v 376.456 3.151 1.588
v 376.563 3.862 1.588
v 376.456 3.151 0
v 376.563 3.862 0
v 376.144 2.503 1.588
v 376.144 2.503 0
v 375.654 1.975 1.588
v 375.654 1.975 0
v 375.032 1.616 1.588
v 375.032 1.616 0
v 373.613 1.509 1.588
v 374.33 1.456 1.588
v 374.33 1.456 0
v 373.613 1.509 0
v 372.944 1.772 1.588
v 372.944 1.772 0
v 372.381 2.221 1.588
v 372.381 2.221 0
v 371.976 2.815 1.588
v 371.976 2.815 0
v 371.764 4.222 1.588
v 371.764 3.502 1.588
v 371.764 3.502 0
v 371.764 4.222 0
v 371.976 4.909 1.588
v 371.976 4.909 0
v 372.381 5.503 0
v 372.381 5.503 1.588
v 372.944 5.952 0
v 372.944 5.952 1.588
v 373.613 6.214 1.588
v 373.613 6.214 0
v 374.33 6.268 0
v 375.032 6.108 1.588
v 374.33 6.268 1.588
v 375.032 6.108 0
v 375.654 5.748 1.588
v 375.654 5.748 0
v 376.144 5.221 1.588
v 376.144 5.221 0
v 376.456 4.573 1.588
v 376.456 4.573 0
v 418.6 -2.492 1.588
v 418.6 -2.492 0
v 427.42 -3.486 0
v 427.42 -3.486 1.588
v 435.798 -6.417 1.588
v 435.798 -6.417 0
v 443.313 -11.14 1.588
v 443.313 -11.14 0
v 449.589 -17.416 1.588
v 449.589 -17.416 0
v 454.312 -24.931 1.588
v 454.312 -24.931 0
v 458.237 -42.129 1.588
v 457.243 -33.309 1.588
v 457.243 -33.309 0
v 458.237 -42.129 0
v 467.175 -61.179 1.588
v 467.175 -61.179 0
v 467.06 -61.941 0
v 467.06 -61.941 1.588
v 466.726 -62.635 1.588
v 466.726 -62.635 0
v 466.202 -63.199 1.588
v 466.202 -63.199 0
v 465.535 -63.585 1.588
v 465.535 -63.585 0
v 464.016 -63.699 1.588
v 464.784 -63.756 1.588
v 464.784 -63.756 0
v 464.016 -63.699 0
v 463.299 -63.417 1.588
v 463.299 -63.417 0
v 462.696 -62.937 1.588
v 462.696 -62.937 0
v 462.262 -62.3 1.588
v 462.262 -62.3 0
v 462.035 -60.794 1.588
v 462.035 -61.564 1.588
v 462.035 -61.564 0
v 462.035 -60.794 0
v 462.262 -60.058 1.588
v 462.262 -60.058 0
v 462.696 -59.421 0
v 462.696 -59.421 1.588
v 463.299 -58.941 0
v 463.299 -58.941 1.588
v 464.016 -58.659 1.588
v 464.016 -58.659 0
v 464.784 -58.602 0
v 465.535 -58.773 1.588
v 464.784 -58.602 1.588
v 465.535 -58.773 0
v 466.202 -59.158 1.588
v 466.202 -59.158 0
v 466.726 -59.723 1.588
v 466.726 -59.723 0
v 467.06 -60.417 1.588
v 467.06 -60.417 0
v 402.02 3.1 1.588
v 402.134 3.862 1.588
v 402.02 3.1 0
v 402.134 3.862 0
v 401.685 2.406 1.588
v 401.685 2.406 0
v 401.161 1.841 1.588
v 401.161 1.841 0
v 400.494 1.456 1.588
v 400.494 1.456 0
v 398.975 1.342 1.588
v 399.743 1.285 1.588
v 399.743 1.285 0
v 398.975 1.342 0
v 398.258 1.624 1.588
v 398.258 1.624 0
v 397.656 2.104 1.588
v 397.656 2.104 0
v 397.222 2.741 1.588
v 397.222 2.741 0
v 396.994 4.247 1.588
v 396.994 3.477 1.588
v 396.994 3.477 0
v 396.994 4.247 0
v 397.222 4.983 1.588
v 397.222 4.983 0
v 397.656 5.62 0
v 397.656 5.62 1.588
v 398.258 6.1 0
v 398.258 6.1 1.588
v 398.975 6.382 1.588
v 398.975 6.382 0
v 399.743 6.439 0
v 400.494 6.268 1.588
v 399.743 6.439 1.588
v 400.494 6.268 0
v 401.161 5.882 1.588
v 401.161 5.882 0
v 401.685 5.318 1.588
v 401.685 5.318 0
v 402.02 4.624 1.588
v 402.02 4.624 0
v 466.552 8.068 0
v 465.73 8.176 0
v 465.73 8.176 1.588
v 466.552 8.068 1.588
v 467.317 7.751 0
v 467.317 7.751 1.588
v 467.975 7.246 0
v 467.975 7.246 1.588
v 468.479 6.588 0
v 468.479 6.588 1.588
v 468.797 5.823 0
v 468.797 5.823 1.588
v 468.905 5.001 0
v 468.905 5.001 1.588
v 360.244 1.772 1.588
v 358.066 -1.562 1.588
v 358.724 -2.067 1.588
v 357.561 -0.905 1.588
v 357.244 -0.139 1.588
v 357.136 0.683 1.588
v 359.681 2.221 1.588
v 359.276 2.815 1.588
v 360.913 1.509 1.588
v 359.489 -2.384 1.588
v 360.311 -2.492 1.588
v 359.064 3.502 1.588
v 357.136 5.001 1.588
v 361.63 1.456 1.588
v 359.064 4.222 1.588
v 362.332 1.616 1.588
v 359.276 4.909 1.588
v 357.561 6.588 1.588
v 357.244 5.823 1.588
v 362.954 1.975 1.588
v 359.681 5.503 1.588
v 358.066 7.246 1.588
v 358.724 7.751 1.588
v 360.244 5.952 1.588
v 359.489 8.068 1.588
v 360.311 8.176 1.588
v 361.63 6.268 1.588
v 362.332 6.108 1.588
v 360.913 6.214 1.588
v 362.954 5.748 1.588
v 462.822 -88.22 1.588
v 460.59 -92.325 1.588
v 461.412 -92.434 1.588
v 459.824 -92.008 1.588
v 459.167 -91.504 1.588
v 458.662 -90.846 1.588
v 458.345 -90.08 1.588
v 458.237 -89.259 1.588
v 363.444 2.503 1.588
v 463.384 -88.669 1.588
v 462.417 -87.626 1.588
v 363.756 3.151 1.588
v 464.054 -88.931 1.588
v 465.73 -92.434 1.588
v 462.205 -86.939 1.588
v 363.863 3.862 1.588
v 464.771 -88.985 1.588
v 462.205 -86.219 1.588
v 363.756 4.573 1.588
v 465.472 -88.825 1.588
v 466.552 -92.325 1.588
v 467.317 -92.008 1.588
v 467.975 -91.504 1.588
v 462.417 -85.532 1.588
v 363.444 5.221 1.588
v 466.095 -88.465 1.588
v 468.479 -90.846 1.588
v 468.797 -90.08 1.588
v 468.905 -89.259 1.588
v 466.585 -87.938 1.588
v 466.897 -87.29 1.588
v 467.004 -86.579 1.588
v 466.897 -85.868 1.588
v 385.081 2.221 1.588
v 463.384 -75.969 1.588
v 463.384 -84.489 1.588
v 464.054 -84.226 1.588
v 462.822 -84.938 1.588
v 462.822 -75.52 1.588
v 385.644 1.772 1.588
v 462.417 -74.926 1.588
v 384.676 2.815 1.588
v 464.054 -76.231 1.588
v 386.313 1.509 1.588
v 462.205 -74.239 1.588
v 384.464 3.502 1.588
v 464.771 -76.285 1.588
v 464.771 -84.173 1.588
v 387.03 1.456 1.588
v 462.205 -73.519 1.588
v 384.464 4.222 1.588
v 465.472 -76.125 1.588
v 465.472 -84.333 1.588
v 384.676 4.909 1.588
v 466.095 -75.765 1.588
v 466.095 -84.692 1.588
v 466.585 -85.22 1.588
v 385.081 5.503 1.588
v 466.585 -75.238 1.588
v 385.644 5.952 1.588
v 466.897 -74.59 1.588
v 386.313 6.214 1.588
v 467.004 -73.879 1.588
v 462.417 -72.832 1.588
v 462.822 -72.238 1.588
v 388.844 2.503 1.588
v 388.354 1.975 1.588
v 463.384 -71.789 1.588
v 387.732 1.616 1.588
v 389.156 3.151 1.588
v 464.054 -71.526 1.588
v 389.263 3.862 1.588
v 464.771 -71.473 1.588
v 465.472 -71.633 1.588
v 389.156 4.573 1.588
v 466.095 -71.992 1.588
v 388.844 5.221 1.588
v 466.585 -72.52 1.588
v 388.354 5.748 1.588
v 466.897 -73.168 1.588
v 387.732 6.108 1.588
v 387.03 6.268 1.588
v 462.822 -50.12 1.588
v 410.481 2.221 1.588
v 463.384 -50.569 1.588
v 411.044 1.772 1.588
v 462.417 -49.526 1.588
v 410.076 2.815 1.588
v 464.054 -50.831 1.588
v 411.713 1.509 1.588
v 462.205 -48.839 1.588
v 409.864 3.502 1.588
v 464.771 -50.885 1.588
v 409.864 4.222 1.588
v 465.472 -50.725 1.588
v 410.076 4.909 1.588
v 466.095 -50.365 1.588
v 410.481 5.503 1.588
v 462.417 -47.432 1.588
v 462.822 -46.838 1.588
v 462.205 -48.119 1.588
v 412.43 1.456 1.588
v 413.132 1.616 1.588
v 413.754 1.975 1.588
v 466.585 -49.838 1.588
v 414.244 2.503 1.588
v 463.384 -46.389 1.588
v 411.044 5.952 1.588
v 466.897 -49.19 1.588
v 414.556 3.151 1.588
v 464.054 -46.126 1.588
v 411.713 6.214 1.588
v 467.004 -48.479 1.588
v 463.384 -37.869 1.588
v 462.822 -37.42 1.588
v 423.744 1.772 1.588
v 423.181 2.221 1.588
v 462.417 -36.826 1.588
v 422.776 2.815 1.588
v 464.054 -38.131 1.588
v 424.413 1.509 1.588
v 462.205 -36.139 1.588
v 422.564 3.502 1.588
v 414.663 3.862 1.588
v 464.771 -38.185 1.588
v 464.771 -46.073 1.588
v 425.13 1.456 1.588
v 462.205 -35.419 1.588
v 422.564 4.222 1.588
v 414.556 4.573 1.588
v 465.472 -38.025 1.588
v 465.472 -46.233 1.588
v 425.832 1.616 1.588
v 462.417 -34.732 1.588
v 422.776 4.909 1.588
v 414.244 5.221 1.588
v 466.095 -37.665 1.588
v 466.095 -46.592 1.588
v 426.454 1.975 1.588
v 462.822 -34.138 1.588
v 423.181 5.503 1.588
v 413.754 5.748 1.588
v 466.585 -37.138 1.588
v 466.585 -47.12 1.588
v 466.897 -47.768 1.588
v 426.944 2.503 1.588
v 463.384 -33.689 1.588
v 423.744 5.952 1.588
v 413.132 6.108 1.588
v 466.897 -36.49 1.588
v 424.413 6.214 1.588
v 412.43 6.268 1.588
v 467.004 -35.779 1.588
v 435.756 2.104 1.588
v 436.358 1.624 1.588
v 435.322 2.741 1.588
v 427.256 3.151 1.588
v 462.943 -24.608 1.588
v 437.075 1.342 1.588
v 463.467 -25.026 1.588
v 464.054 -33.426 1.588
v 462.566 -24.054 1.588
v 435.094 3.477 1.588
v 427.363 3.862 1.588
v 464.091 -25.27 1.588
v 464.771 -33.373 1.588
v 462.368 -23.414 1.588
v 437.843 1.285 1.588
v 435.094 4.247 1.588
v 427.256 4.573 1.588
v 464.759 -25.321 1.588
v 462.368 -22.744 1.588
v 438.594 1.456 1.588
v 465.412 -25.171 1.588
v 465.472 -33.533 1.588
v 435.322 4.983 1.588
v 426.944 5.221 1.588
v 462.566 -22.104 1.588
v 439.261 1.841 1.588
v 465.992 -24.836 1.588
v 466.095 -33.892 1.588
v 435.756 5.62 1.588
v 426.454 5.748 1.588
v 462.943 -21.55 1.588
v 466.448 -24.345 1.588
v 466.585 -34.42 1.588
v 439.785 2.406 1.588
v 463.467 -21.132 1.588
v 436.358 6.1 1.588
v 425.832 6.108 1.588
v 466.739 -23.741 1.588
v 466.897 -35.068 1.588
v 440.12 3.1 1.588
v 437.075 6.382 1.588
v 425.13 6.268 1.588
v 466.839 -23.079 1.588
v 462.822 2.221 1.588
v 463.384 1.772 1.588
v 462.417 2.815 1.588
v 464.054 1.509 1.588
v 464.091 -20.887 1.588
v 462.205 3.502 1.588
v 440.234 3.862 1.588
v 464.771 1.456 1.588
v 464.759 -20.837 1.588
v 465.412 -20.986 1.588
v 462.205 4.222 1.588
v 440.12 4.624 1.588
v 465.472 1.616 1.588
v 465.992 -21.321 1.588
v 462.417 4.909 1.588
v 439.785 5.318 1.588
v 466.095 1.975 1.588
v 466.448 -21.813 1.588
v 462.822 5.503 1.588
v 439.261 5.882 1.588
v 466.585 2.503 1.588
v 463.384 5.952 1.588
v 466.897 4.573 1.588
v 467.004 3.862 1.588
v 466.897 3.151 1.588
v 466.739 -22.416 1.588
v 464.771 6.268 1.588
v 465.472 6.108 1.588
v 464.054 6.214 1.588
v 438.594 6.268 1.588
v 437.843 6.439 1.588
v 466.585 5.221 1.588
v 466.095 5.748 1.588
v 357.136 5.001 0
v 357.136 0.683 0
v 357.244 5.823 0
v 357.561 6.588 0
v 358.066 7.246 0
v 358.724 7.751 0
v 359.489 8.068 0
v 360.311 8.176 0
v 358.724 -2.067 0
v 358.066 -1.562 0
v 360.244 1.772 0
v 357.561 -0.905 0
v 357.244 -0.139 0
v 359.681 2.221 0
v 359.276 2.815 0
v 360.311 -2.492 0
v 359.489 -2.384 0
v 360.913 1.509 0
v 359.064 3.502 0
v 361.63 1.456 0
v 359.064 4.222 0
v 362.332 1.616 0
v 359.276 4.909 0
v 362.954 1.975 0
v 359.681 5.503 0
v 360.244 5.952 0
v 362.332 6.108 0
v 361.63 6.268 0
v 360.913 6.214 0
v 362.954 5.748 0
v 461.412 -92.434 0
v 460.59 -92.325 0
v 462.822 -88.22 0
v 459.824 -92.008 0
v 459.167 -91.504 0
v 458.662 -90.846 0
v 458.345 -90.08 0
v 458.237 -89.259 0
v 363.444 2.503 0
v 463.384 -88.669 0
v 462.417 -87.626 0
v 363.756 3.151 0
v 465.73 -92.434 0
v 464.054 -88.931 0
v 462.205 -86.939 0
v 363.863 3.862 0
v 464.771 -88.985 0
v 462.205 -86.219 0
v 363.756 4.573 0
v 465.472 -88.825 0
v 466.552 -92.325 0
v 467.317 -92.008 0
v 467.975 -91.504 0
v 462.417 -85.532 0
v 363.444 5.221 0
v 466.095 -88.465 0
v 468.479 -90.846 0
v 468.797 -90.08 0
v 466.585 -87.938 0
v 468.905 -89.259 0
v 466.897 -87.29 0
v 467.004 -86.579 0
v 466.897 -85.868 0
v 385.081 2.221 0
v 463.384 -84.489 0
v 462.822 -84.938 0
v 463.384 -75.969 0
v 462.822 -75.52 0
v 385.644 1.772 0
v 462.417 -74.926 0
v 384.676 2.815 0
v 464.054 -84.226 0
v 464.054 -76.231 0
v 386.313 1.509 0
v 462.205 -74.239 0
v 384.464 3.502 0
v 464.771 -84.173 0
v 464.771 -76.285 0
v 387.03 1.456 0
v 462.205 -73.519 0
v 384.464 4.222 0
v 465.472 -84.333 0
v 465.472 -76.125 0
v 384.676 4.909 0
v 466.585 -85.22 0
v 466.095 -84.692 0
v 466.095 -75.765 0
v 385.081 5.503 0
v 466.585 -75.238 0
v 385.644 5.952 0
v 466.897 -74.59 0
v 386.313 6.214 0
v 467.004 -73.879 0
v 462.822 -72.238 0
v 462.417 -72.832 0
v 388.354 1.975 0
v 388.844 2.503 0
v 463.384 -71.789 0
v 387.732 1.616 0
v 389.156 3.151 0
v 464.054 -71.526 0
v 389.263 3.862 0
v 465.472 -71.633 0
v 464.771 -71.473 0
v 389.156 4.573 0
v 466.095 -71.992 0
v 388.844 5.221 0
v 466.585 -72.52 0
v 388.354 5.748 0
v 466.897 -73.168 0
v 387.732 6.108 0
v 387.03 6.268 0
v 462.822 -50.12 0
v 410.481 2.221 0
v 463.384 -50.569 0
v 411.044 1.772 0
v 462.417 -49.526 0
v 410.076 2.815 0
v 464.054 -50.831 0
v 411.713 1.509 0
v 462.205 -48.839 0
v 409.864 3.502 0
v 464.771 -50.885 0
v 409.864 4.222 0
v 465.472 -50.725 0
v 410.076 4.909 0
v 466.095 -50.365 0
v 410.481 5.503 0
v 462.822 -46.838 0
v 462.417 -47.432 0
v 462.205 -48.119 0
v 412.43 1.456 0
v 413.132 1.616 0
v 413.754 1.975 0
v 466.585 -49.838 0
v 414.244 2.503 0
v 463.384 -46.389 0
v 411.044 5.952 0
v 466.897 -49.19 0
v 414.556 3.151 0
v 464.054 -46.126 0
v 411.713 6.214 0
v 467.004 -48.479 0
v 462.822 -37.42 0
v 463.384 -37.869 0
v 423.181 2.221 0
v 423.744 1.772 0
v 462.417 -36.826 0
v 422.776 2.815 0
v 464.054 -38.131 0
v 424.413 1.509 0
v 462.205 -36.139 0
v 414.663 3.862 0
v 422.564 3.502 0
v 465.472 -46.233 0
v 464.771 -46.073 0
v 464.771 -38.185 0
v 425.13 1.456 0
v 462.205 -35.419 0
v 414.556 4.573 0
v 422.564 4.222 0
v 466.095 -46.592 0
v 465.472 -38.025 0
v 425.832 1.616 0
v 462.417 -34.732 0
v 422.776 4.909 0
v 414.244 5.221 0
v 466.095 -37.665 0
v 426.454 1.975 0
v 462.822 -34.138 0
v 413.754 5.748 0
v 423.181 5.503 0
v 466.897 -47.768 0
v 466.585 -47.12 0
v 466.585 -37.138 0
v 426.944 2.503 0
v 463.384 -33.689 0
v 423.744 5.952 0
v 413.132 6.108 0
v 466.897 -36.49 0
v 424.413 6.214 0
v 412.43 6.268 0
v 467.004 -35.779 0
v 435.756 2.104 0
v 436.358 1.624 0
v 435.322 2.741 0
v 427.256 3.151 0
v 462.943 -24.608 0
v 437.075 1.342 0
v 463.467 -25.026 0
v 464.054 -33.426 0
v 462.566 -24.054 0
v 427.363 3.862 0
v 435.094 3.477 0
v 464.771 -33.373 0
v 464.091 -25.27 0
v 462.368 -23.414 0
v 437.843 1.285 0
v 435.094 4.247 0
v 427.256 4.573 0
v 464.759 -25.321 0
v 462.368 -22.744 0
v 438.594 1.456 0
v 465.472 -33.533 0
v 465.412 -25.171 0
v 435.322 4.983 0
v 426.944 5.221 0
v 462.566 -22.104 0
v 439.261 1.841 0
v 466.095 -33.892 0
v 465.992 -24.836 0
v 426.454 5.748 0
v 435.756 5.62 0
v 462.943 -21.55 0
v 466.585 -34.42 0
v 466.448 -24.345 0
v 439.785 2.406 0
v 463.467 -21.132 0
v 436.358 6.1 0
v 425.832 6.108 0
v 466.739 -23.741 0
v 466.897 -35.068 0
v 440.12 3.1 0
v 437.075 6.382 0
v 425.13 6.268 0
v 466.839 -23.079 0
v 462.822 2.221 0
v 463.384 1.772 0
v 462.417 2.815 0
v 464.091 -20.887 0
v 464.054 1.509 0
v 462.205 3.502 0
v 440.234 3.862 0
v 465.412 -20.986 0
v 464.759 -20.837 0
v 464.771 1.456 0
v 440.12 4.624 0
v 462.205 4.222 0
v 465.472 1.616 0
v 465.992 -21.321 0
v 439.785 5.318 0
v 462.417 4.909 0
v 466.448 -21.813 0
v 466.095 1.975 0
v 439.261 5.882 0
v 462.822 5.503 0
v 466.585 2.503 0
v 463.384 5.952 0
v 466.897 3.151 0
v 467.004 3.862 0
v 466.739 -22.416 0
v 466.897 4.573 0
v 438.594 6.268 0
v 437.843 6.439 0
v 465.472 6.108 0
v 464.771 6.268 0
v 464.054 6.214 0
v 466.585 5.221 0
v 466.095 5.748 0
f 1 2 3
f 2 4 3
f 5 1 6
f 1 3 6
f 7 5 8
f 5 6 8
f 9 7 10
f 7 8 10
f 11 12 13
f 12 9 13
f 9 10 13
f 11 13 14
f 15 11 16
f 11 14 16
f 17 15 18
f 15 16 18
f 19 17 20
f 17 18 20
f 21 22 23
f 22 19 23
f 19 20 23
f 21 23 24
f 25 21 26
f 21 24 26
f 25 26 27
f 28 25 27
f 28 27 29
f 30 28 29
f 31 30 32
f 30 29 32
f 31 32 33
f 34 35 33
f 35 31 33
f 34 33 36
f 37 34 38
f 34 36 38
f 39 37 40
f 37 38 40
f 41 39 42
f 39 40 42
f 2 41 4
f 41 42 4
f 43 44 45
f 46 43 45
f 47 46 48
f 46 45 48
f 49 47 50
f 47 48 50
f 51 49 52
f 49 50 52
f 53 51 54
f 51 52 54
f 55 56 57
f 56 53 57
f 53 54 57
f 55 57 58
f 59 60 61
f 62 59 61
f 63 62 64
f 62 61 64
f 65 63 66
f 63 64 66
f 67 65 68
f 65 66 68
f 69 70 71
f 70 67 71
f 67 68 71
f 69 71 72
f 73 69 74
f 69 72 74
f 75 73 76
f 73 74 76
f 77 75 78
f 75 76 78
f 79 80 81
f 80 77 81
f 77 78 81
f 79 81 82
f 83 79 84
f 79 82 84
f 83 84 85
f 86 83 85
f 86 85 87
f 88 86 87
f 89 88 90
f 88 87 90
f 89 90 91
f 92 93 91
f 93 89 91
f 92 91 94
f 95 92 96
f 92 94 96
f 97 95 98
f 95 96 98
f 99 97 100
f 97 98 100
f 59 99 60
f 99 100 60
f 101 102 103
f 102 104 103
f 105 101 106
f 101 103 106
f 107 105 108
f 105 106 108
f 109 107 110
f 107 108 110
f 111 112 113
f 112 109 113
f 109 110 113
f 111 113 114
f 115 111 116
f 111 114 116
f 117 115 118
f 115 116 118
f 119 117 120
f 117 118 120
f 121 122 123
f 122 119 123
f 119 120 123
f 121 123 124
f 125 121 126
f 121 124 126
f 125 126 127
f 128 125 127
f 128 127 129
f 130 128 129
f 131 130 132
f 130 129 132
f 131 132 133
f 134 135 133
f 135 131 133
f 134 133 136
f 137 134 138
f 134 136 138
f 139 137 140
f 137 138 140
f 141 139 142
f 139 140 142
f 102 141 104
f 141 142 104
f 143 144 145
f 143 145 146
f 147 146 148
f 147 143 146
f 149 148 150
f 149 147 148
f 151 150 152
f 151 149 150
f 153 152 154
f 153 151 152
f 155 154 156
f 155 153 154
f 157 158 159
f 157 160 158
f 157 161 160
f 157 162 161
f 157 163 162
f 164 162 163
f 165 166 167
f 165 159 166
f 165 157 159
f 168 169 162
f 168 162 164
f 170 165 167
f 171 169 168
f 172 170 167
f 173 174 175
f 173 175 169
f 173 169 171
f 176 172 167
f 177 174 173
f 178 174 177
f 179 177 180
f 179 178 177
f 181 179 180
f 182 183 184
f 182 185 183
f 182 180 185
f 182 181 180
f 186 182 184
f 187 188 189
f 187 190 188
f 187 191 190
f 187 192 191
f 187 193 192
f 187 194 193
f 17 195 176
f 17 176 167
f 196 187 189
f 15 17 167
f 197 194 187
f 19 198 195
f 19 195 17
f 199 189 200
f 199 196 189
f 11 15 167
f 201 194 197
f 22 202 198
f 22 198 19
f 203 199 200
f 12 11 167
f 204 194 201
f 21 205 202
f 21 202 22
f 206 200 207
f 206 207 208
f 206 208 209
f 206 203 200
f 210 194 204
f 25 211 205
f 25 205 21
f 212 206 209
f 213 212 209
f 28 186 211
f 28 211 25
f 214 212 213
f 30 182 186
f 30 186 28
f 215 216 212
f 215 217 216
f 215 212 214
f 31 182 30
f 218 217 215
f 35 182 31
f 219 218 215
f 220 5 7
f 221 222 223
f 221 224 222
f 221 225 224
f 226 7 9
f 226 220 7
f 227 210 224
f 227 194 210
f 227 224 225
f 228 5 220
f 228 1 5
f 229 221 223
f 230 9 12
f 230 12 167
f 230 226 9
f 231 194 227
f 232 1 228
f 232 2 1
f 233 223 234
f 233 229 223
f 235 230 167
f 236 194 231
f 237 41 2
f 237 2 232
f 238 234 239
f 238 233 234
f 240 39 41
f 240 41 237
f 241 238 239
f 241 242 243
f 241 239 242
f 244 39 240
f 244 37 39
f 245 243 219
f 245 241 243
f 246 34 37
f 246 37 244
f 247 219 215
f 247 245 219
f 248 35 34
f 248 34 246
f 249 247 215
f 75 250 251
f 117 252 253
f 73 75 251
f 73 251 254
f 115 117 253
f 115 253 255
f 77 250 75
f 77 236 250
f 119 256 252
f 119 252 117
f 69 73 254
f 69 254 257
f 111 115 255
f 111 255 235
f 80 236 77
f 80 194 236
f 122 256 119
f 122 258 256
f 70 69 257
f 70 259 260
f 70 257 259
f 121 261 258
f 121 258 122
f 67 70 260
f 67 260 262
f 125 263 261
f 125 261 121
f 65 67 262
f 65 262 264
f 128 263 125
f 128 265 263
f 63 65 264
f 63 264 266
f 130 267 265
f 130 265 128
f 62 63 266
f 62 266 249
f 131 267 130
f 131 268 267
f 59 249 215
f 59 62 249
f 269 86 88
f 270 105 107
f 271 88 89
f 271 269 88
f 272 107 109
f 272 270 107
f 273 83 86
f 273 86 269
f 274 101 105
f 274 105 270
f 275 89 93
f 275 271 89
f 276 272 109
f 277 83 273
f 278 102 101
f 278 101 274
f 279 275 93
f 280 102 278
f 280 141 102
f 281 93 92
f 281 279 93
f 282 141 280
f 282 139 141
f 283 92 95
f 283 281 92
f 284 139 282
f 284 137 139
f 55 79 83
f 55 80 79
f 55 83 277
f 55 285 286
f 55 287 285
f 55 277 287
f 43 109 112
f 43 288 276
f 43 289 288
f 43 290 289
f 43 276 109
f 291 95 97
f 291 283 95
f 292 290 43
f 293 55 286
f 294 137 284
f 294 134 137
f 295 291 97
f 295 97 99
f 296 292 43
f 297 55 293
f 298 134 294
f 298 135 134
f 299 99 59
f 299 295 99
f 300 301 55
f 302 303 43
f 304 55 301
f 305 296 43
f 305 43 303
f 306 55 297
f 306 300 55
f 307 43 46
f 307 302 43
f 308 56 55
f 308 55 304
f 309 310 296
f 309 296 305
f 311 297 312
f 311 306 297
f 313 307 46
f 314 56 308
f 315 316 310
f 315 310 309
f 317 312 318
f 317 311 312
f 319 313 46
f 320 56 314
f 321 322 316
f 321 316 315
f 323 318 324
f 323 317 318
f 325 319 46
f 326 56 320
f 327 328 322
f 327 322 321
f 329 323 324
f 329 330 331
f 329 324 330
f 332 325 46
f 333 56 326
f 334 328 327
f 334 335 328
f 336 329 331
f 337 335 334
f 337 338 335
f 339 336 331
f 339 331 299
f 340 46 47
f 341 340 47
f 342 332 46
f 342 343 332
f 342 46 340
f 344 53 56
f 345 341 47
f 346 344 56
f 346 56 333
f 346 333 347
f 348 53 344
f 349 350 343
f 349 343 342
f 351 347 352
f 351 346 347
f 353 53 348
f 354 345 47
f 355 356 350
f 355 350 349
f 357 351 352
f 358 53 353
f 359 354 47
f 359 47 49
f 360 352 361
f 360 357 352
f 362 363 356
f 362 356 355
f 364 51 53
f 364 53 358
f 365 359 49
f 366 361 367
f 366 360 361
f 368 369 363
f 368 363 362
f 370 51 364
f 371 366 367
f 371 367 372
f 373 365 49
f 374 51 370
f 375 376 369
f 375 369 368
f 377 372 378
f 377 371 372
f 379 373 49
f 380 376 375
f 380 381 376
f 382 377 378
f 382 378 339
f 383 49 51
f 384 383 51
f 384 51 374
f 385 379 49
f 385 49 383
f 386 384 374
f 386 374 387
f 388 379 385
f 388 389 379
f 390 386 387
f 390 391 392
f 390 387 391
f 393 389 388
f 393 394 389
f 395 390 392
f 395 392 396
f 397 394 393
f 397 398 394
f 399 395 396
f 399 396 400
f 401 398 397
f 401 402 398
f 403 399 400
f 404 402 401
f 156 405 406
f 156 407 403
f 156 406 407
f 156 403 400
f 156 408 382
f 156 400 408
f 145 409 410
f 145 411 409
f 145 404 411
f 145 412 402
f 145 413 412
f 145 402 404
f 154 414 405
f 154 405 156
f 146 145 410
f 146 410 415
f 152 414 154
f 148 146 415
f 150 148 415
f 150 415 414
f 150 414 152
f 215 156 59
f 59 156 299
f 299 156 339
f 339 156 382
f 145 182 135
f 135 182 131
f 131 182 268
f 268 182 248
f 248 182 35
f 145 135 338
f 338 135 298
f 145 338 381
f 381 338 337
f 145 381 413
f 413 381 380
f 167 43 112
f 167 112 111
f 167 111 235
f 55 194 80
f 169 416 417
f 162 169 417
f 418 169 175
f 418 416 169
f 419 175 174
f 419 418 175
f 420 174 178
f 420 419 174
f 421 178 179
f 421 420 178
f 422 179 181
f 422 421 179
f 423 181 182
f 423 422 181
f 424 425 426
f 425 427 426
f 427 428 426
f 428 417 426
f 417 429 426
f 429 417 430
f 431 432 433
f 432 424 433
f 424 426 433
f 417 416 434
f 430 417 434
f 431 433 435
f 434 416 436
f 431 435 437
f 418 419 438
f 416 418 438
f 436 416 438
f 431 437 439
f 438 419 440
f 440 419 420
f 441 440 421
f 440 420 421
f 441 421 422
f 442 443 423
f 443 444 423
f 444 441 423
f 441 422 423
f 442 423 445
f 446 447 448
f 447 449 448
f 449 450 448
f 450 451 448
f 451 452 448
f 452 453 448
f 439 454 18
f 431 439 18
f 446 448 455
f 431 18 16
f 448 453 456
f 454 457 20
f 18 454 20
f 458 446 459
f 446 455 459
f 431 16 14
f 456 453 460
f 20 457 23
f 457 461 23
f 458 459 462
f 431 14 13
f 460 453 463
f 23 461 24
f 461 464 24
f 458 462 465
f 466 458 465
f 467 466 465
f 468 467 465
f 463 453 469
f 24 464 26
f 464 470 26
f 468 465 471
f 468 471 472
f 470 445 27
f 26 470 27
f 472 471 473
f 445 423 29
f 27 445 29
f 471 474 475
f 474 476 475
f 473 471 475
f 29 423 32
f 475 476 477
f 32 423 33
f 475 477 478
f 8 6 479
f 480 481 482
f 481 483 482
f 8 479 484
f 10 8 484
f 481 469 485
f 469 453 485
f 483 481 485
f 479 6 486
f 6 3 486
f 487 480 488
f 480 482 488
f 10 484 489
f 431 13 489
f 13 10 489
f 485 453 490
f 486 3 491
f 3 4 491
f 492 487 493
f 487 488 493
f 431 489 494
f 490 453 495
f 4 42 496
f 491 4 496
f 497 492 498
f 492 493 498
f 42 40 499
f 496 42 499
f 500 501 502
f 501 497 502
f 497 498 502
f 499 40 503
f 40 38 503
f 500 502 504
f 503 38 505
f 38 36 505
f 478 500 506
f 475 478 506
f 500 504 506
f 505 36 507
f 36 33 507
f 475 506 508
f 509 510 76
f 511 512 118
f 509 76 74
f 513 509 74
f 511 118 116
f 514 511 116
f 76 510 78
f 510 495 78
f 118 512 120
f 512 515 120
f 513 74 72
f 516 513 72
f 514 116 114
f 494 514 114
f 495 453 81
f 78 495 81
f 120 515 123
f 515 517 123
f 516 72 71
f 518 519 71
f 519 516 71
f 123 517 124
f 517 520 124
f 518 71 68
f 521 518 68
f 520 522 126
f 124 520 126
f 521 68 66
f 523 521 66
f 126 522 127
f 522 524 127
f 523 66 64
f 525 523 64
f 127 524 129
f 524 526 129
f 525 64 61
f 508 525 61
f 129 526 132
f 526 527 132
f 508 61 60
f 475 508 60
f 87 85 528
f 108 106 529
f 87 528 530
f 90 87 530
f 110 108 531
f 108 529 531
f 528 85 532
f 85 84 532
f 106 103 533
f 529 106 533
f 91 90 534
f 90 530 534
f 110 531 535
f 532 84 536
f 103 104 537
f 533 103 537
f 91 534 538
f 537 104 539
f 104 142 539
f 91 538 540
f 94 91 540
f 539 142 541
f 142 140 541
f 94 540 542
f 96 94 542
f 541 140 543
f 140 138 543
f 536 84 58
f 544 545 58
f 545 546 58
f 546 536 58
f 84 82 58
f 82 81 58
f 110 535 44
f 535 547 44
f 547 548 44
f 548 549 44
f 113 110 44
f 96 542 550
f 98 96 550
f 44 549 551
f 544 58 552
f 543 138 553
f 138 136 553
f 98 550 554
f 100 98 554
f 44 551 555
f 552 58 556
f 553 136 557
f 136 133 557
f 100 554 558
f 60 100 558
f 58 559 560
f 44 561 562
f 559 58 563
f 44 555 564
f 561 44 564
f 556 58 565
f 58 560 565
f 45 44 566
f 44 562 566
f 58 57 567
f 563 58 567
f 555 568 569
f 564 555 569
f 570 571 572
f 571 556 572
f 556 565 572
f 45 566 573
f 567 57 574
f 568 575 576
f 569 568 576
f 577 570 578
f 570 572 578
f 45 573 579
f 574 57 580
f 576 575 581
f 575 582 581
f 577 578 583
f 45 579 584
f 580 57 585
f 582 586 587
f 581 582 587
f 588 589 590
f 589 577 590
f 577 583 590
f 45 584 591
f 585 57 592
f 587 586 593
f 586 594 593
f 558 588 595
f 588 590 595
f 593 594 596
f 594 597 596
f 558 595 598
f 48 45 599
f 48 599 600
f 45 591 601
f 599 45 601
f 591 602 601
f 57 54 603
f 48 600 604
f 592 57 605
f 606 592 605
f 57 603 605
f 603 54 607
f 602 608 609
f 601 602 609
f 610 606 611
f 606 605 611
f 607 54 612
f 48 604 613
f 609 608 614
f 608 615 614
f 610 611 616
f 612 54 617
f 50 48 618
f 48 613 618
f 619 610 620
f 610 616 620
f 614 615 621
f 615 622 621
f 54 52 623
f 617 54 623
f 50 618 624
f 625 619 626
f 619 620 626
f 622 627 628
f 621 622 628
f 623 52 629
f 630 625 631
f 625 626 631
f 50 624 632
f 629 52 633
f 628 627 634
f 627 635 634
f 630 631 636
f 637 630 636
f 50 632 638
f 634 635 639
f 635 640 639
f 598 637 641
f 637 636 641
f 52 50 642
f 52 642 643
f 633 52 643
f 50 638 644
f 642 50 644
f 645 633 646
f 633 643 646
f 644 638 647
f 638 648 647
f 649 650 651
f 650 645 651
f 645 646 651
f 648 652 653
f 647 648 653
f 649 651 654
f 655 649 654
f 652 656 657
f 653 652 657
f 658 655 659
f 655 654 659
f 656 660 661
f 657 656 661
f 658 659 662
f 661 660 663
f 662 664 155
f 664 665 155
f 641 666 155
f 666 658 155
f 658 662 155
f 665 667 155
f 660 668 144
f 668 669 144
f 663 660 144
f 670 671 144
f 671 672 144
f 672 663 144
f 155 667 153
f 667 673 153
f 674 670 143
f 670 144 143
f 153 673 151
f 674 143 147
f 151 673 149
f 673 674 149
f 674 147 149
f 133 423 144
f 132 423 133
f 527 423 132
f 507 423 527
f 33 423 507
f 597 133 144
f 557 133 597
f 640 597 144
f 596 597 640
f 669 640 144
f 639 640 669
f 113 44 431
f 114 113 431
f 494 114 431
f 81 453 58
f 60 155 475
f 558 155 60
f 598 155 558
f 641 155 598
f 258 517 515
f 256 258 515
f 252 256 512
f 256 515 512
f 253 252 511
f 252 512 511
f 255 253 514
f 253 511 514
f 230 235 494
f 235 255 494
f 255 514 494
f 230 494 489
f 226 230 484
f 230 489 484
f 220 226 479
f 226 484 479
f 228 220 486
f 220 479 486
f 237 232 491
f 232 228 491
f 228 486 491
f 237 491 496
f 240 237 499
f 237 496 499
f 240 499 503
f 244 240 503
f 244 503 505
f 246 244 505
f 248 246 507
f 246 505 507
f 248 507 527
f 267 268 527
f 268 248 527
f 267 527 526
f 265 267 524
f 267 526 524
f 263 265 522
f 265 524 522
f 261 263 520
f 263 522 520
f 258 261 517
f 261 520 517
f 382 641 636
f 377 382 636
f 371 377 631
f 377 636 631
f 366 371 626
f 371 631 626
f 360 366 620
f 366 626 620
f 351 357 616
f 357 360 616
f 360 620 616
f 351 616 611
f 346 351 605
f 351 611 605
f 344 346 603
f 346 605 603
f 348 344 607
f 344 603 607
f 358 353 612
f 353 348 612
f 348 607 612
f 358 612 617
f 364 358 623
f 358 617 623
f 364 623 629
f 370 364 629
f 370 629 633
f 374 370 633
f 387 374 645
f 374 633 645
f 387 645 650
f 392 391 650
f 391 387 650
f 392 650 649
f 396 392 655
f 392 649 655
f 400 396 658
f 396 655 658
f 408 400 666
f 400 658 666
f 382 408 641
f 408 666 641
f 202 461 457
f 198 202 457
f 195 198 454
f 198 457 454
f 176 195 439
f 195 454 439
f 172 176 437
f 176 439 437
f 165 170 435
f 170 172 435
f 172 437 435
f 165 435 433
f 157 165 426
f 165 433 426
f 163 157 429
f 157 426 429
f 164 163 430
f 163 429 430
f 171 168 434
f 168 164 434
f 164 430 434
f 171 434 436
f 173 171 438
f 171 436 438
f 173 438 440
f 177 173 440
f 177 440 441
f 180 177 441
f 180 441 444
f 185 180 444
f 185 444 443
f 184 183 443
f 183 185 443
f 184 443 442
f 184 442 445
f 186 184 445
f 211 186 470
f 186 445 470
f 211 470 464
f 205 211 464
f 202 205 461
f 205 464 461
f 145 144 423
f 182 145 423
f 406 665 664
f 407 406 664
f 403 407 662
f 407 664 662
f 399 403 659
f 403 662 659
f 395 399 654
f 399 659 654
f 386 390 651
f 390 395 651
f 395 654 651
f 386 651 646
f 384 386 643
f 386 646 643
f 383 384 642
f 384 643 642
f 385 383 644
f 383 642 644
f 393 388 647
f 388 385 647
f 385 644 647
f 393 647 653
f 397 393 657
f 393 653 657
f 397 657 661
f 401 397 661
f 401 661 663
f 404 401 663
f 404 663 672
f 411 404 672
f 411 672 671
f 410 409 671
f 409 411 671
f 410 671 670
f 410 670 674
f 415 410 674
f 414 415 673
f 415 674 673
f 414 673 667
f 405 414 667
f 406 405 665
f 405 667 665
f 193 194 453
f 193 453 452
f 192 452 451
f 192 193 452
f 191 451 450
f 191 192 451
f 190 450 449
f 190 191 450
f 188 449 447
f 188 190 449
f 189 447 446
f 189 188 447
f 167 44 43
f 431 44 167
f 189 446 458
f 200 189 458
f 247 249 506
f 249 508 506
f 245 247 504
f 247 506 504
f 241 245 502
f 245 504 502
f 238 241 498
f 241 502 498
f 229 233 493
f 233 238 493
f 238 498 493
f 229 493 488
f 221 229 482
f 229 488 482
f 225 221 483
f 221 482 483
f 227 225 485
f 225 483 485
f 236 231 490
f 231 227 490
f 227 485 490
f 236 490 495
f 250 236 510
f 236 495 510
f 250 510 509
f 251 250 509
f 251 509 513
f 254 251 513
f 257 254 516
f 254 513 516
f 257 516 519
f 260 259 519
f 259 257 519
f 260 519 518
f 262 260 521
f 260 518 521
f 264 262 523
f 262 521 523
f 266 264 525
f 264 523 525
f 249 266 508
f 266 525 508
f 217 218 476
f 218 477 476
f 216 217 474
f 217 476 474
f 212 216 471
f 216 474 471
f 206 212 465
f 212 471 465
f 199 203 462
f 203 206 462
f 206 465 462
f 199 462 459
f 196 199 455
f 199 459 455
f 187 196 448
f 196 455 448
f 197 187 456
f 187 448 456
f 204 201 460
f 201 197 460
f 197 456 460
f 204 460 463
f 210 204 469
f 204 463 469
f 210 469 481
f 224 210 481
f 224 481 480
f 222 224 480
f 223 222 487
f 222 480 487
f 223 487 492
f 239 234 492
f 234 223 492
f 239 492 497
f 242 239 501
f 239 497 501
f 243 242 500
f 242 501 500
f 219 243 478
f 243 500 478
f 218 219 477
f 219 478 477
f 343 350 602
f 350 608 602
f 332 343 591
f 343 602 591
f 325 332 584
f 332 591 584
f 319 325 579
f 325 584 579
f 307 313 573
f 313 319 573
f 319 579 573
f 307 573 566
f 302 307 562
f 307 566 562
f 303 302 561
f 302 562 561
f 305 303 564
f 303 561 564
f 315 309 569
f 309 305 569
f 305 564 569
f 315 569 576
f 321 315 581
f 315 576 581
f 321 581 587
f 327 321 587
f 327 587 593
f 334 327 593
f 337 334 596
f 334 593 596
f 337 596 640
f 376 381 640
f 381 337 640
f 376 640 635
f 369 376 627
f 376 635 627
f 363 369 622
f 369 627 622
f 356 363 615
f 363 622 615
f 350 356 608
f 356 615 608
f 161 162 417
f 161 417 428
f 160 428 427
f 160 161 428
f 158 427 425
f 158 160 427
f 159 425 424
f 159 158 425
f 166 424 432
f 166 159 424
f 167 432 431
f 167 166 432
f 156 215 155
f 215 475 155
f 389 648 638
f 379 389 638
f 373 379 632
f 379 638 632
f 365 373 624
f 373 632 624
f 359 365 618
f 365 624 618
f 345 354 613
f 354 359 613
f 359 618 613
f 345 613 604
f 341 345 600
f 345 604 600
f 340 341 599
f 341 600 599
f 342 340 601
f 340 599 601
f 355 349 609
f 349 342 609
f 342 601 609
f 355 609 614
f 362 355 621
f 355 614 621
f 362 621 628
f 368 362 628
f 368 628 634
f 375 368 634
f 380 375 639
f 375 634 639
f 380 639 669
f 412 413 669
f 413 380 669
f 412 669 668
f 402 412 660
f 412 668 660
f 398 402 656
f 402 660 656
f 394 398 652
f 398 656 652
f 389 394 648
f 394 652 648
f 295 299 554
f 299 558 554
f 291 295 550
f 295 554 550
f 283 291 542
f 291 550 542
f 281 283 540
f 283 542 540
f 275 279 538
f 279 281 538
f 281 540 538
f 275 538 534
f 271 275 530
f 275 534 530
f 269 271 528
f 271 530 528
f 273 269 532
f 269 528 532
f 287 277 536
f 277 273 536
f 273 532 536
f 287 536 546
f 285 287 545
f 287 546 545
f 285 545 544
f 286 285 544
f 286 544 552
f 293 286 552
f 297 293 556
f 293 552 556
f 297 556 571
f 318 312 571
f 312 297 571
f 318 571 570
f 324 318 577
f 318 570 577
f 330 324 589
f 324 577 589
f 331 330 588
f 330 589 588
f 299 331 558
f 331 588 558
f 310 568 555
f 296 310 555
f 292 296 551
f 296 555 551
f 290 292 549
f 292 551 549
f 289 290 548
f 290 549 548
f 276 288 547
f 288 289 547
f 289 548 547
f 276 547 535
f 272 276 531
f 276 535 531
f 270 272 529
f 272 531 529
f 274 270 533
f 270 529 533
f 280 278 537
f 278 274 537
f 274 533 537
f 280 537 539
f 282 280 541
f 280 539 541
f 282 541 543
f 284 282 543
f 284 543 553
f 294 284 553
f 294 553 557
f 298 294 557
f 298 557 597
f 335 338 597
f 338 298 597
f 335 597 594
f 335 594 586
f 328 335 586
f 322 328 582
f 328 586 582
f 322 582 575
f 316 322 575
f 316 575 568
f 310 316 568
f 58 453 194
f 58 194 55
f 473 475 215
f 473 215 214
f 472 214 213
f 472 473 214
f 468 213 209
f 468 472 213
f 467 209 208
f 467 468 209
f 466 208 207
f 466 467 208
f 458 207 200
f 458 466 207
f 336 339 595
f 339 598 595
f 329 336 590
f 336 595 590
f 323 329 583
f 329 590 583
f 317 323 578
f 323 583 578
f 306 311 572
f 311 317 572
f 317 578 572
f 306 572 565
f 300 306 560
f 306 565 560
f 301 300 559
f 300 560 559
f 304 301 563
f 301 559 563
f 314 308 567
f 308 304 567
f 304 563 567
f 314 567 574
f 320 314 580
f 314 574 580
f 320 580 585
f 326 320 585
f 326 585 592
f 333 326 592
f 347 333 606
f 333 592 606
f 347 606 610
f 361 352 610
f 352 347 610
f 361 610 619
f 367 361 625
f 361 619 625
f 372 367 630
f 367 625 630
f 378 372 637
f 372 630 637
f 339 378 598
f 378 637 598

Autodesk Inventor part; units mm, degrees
ref_plane "YZ Plane" through (0, 0, 0) normal (1, 0, 0) x (0, 1, 0)
ref_plane "XZ Plane" through (0, 0, 0) normal (0, 1, 0) x (-1, 0, 0)
ref_plane "XY Plane" through (0, 0, 0) normal (0, 0, 1) x (1, 0, 0)
ref_plane "Work Plane1" through (0, 0, 0) normal (0, 0, 1) x (1, 0, 0)
sketch "Sketch1" plane through (0, 0, 0) normal (0, 0, 1) x (1, 0, 0)
  line L0 (468.9048, -89.2586) -> (468.9048, 5.0009) projected
  arc A0 (468.9048, 5.0009) -> (465.7298, 8.1759) centre (465.7298, 5.0009) ccw projected
  line L1 (465.7298, 8.1759) -> (360.311, 8.1759) projected
  line L2 (458.2368, -92.4336) -> (458.2368, -2.4921)
  line L3 (458.2368, -2.4921) -> (357.136, -2.4921)
  arc A1 (360.311, 8.1759) -> (357.136, 5.0009) centre (360.311, 5.0009) ccw projected
  line L4 (357.136, 5.0009) -> (357.136, -89.2586) projected
  arc A2 (357.136, -89.2586) -> (360.311, -92.4336) centre (360.311, -89.2586) ccw projected
  line L5 (360.311, -92.4336) -> (465.7298, -92.4336) projected
  arc A3 (465.7298, -92.4336) -> (468.9048, -89.2586) centre (465.7298, -89.2586) ccw projected
  line L6 (468.9048, -89.2586) -> (468.9048, 5.0009) projected
  arc A4 (468.9048, 5.0009) -> (465.7298, 8.1759) centre (465.7298, 5.0009) ccw projected
  line L7 (465.7298, 8.1759) -> (360.311, 8.1759) projected
  circle A5 centre (437.65, 3.8619) radius 2.5844 projected
  circle A6 centre (372.6092, -23.0789) radius 2.5844 projected
  circle A7 centre (399.55, -88.1196) radius 2.5844 projected
  circle A8 centre (464.5908, -61.1789) radius 2.5844 projected
  circle A9 centre (372.6092, -88.1196) radius 2.413 projected
  circle A10 centre (412.25, 3.8619) radius 2.413 projected
  circle A11 centre (464.5908, -73.8789) radius 2.413 projected
  circle A12 centre (464.5908, -48.4789) radius 2.413 projected
  circle A13 centre (464.5908, -35.7789) radius 2.413 projected
  circle A14 centre (374.15, 3.8619) radius 2.413 projected
  circle A15 centre (386.85, 3.8619) radius 2.413 projected
  arc A16 (365.5823, -19.7251) -> (365.5823, -17.8759) centre (362.2803, -18.8005) ccw projected
  line L8 (365.5823, -19.7251) -> (365.5823, -22.1025) projected
  line L9 (365.5823, -22.1025) -> (363.2049, -22.1025) projected
  arc A17 (361.3557, -22.1025) -> (363.2049, -22.1025) centre (362.2803, -18.8005) ccw projected
  line L10 (361.3557, -22.1025) -> (358.9783, -22.1025) projected
  line L11 (358.9783, -22.1025) -> (358.9783, -19.7251) projected
  arc A18 (358.9783, -17.8759) -> (358.9783, -19.7251) centre (362.2803, -18.8005) ccw projected
  line L12 (358.9783, -17.8759) -> (358.9783, -15.4985) projected
  line L13 (358.9783, -15.4985) -> (361.3557, -15.4985) projected
  arc A19 (363.2049, -15.4985) -> (361.3557, -15.4985) centre (362.2803, -18.8005) ccw projected
  line L14 (363.2049, -15.4985) -> (365.5823, -15.4985) projected
  line L15 (365.5823, -15.4985) -> (365.5823, -17.8759) projected
  circle A20 centre (424.95, 3.8619) radius 2.413 projected
  arc A21 (358.9783, -64.5327) -> (358.9783, -66.3818) centre (362.2803, -65.4572) ccw projected
  line L16 (358.9783, -64.5327) -> (358.9783, -62.1552) projected
  line L17 (358.9783, -62.1552) -> (361.3557, -62.1552) projected
  arc A22 (363.2049, -62.1552) -> (361.3557, -62.1552) centre (362.2803, -65.4572) ccw projected
  line L18 (363.2049, -62.1552) -> (365.5823, -62.1552) projected
  line L19 (365.5823, -62.1552) -> (365.5823, -64.5327) projected
  arc A23 (365.5823, -66.3818) -> (365.5823, -64.5327) centre (362.2803, -65.4572) ccw projected
  line L20 (365.5823, -66.3818) -> (365.5823, -68.7592) projected
  line L21 (365.5823, -68.7592) -> (363.2049, -68.7592) projected
  arc A24 (361.3557, -68.7592) -> (363.2049, -68.7592) centre (362.2803, -65.4572) ccw projected
  line L22 (361.3557, -68.7592) -> (358.9783, -68.7592) projected
  line L23 (358.9783, -68.7592) -> (358.9783, -66.3818) projected
  circle A25 centre (464.5908, -86.5789) radius 2.413 projected
  circle A26 centre (464.5908, -23.0789) radius 1.9844 projected
  circle A27 centre (464.5908, 3.8619) radius 2.413 projected
  circle A28 centre (361.45, 3.8619) radius 2.413 projected
  circle A29 centre (418.6, -42.1289) radius 36.6 projected
  circle A30 centre (437.65, -88.1196) radius 2.5844 projected
  circle A31 centre (372.6092, -61.1789) radius 2.5844 projected
  circle A32 centre (399.55, 3.8619) radius 2.5844 projected
  circle A33 centre (418.6, -42.1289) radius 39.6368
  circle A34 centre (464.5908, 3.8619) radius 2.2479
  circle A35 centre (464.5908, -23.0789) radius 2.2479
  circle A36 centre (464.5908, -35.7789) radius 2.2479
  circle A37 centre (464.5908, -48.4789) radius 2.2479
  circle A38 centre (464.5908, -61.1789) radius 2.2479
  circle A39 centre (464.5908, -73.8789) radius 2.2479
  circle A40 centre (464.5908, -86.5789) radius 2.2479
  circle A41 centre (437.65, 3.8619) radius 2.2479
  circle A42 centre (424.95, 3.8619) radius 2.2479
  circle A43 centre (412.25, 3.8619) radius 2.2479
  circle A44 centre (399.55, 3.8619) radius 2.2479
  circle A45 centre (386.85, 3.8619) radius 2.2479
  circle A46 centre (374.15, 3.8619) radius 2.2479
  circle A47 centre (361.45, 3.8619) radius 2.2479
  point P0 (0, 0)
  point P1 (418.6, -2.4921)
  point P2 (458.2368, -42.1289)
  dimension "d0" = 10.668
  dimension "d2" = 4.4958
  dimension "d5" = 12.7
  dimension "d10" = 4.4958
  dimension "d13" = 12.7
extrude "Extrusion1" add sketch "Sketch1" along normal blind 1.5875 contours A3 L5 L2 L3 L4 A1 L1 A0 L0 | A33 L3 L2
fillet "Fillet1" radius 3.175 2 edges at (458.2368, -92.4336, 0.7938) (357.136, -2.4921, 0.7938)
properties part number "UnderGusset" material "Aluminum 6061"
